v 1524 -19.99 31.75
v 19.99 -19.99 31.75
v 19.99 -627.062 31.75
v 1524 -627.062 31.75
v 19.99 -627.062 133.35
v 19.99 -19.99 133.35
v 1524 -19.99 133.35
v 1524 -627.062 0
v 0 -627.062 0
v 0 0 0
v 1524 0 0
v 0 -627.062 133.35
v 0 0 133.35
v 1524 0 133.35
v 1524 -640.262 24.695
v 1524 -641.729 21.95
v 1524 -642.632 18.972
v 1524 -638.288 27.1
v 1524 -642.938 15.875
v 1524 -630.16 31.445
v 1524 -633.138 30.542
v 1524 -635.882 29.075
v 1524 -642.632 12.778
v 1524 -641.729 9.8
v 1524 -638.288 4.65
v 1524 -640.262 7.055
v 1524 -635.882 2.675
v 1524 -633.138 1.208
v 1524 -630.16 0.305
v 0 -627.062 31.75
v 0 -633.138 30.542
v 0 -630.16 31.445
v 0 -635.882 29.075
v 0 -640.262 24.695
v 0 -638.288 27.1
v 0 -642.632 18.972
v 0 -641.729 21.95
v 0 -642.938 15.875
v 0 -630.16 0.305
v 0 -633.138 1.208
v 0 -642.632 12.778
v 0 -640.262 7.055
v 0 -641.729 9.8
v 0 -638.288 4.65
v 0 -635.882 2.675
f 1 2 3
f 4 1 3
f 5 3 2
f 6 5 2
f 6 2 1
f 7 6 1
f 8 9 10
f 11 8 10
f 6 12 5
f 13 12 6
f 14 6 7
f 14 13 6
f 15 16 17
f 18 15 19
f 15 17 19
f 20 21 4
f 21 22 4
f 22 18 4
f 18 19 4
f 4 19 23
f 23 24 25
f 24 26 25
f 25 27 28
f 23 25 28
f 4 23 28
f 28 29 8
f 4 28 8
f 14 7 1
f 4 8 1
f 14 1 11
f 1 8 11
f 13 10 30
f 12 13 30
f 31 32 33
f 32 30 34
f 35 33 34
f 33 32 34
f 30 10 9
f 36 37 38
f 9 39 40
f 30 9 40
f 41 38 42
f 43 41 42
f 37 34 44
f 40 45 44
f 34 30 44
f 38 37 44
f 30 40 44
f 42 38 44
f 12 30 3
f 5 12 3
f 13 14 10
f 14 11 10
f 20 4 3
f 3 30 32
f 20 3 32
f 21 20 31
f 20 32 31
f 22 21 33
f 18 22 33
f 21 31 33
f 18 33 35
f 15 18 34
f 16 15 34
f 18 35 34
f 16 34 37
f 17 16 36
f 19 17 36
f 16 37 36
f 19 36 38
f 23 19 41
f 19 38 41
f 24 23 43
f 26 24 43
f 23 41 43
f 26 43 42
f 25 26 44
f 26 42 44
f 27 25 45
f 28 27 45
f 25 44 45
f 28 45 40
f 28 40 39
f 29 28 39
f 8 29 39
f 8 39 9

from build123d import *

# Parameters (mm, degrees)
F1_DEPTH = 1524
F3_DEPTH = 101.6


with BuildPart() as f1:
    # F0 (on Right) → F1 (new body)
    with BuildSketch(Plane.YZ):
        with BuildLine():
            Line((-627.0625, 0), (0, 0))
            Line((0, 0), (0, 31.75))
            Line((0, 31.75), (-627.0625, 31.75))
            ThreePointArc((-627.0625, 31.75), (-642.9375, 15.875), (-627.0625, 0))
        make_face()
    extrude(amount=F1_DEPTH)

    # F2 (on face) → F3 (join)
    with BuildSketch(Plane.XY.offset(31.75)):
        Polygon((19.9898, -627.0625), (19.9898, -19.9898), (1524, -19.9898), (1524, 0), (0, 0), (0, -627.0625), align=None)
    extrude(amount=F3_DEPTH)


solid = f1.part
